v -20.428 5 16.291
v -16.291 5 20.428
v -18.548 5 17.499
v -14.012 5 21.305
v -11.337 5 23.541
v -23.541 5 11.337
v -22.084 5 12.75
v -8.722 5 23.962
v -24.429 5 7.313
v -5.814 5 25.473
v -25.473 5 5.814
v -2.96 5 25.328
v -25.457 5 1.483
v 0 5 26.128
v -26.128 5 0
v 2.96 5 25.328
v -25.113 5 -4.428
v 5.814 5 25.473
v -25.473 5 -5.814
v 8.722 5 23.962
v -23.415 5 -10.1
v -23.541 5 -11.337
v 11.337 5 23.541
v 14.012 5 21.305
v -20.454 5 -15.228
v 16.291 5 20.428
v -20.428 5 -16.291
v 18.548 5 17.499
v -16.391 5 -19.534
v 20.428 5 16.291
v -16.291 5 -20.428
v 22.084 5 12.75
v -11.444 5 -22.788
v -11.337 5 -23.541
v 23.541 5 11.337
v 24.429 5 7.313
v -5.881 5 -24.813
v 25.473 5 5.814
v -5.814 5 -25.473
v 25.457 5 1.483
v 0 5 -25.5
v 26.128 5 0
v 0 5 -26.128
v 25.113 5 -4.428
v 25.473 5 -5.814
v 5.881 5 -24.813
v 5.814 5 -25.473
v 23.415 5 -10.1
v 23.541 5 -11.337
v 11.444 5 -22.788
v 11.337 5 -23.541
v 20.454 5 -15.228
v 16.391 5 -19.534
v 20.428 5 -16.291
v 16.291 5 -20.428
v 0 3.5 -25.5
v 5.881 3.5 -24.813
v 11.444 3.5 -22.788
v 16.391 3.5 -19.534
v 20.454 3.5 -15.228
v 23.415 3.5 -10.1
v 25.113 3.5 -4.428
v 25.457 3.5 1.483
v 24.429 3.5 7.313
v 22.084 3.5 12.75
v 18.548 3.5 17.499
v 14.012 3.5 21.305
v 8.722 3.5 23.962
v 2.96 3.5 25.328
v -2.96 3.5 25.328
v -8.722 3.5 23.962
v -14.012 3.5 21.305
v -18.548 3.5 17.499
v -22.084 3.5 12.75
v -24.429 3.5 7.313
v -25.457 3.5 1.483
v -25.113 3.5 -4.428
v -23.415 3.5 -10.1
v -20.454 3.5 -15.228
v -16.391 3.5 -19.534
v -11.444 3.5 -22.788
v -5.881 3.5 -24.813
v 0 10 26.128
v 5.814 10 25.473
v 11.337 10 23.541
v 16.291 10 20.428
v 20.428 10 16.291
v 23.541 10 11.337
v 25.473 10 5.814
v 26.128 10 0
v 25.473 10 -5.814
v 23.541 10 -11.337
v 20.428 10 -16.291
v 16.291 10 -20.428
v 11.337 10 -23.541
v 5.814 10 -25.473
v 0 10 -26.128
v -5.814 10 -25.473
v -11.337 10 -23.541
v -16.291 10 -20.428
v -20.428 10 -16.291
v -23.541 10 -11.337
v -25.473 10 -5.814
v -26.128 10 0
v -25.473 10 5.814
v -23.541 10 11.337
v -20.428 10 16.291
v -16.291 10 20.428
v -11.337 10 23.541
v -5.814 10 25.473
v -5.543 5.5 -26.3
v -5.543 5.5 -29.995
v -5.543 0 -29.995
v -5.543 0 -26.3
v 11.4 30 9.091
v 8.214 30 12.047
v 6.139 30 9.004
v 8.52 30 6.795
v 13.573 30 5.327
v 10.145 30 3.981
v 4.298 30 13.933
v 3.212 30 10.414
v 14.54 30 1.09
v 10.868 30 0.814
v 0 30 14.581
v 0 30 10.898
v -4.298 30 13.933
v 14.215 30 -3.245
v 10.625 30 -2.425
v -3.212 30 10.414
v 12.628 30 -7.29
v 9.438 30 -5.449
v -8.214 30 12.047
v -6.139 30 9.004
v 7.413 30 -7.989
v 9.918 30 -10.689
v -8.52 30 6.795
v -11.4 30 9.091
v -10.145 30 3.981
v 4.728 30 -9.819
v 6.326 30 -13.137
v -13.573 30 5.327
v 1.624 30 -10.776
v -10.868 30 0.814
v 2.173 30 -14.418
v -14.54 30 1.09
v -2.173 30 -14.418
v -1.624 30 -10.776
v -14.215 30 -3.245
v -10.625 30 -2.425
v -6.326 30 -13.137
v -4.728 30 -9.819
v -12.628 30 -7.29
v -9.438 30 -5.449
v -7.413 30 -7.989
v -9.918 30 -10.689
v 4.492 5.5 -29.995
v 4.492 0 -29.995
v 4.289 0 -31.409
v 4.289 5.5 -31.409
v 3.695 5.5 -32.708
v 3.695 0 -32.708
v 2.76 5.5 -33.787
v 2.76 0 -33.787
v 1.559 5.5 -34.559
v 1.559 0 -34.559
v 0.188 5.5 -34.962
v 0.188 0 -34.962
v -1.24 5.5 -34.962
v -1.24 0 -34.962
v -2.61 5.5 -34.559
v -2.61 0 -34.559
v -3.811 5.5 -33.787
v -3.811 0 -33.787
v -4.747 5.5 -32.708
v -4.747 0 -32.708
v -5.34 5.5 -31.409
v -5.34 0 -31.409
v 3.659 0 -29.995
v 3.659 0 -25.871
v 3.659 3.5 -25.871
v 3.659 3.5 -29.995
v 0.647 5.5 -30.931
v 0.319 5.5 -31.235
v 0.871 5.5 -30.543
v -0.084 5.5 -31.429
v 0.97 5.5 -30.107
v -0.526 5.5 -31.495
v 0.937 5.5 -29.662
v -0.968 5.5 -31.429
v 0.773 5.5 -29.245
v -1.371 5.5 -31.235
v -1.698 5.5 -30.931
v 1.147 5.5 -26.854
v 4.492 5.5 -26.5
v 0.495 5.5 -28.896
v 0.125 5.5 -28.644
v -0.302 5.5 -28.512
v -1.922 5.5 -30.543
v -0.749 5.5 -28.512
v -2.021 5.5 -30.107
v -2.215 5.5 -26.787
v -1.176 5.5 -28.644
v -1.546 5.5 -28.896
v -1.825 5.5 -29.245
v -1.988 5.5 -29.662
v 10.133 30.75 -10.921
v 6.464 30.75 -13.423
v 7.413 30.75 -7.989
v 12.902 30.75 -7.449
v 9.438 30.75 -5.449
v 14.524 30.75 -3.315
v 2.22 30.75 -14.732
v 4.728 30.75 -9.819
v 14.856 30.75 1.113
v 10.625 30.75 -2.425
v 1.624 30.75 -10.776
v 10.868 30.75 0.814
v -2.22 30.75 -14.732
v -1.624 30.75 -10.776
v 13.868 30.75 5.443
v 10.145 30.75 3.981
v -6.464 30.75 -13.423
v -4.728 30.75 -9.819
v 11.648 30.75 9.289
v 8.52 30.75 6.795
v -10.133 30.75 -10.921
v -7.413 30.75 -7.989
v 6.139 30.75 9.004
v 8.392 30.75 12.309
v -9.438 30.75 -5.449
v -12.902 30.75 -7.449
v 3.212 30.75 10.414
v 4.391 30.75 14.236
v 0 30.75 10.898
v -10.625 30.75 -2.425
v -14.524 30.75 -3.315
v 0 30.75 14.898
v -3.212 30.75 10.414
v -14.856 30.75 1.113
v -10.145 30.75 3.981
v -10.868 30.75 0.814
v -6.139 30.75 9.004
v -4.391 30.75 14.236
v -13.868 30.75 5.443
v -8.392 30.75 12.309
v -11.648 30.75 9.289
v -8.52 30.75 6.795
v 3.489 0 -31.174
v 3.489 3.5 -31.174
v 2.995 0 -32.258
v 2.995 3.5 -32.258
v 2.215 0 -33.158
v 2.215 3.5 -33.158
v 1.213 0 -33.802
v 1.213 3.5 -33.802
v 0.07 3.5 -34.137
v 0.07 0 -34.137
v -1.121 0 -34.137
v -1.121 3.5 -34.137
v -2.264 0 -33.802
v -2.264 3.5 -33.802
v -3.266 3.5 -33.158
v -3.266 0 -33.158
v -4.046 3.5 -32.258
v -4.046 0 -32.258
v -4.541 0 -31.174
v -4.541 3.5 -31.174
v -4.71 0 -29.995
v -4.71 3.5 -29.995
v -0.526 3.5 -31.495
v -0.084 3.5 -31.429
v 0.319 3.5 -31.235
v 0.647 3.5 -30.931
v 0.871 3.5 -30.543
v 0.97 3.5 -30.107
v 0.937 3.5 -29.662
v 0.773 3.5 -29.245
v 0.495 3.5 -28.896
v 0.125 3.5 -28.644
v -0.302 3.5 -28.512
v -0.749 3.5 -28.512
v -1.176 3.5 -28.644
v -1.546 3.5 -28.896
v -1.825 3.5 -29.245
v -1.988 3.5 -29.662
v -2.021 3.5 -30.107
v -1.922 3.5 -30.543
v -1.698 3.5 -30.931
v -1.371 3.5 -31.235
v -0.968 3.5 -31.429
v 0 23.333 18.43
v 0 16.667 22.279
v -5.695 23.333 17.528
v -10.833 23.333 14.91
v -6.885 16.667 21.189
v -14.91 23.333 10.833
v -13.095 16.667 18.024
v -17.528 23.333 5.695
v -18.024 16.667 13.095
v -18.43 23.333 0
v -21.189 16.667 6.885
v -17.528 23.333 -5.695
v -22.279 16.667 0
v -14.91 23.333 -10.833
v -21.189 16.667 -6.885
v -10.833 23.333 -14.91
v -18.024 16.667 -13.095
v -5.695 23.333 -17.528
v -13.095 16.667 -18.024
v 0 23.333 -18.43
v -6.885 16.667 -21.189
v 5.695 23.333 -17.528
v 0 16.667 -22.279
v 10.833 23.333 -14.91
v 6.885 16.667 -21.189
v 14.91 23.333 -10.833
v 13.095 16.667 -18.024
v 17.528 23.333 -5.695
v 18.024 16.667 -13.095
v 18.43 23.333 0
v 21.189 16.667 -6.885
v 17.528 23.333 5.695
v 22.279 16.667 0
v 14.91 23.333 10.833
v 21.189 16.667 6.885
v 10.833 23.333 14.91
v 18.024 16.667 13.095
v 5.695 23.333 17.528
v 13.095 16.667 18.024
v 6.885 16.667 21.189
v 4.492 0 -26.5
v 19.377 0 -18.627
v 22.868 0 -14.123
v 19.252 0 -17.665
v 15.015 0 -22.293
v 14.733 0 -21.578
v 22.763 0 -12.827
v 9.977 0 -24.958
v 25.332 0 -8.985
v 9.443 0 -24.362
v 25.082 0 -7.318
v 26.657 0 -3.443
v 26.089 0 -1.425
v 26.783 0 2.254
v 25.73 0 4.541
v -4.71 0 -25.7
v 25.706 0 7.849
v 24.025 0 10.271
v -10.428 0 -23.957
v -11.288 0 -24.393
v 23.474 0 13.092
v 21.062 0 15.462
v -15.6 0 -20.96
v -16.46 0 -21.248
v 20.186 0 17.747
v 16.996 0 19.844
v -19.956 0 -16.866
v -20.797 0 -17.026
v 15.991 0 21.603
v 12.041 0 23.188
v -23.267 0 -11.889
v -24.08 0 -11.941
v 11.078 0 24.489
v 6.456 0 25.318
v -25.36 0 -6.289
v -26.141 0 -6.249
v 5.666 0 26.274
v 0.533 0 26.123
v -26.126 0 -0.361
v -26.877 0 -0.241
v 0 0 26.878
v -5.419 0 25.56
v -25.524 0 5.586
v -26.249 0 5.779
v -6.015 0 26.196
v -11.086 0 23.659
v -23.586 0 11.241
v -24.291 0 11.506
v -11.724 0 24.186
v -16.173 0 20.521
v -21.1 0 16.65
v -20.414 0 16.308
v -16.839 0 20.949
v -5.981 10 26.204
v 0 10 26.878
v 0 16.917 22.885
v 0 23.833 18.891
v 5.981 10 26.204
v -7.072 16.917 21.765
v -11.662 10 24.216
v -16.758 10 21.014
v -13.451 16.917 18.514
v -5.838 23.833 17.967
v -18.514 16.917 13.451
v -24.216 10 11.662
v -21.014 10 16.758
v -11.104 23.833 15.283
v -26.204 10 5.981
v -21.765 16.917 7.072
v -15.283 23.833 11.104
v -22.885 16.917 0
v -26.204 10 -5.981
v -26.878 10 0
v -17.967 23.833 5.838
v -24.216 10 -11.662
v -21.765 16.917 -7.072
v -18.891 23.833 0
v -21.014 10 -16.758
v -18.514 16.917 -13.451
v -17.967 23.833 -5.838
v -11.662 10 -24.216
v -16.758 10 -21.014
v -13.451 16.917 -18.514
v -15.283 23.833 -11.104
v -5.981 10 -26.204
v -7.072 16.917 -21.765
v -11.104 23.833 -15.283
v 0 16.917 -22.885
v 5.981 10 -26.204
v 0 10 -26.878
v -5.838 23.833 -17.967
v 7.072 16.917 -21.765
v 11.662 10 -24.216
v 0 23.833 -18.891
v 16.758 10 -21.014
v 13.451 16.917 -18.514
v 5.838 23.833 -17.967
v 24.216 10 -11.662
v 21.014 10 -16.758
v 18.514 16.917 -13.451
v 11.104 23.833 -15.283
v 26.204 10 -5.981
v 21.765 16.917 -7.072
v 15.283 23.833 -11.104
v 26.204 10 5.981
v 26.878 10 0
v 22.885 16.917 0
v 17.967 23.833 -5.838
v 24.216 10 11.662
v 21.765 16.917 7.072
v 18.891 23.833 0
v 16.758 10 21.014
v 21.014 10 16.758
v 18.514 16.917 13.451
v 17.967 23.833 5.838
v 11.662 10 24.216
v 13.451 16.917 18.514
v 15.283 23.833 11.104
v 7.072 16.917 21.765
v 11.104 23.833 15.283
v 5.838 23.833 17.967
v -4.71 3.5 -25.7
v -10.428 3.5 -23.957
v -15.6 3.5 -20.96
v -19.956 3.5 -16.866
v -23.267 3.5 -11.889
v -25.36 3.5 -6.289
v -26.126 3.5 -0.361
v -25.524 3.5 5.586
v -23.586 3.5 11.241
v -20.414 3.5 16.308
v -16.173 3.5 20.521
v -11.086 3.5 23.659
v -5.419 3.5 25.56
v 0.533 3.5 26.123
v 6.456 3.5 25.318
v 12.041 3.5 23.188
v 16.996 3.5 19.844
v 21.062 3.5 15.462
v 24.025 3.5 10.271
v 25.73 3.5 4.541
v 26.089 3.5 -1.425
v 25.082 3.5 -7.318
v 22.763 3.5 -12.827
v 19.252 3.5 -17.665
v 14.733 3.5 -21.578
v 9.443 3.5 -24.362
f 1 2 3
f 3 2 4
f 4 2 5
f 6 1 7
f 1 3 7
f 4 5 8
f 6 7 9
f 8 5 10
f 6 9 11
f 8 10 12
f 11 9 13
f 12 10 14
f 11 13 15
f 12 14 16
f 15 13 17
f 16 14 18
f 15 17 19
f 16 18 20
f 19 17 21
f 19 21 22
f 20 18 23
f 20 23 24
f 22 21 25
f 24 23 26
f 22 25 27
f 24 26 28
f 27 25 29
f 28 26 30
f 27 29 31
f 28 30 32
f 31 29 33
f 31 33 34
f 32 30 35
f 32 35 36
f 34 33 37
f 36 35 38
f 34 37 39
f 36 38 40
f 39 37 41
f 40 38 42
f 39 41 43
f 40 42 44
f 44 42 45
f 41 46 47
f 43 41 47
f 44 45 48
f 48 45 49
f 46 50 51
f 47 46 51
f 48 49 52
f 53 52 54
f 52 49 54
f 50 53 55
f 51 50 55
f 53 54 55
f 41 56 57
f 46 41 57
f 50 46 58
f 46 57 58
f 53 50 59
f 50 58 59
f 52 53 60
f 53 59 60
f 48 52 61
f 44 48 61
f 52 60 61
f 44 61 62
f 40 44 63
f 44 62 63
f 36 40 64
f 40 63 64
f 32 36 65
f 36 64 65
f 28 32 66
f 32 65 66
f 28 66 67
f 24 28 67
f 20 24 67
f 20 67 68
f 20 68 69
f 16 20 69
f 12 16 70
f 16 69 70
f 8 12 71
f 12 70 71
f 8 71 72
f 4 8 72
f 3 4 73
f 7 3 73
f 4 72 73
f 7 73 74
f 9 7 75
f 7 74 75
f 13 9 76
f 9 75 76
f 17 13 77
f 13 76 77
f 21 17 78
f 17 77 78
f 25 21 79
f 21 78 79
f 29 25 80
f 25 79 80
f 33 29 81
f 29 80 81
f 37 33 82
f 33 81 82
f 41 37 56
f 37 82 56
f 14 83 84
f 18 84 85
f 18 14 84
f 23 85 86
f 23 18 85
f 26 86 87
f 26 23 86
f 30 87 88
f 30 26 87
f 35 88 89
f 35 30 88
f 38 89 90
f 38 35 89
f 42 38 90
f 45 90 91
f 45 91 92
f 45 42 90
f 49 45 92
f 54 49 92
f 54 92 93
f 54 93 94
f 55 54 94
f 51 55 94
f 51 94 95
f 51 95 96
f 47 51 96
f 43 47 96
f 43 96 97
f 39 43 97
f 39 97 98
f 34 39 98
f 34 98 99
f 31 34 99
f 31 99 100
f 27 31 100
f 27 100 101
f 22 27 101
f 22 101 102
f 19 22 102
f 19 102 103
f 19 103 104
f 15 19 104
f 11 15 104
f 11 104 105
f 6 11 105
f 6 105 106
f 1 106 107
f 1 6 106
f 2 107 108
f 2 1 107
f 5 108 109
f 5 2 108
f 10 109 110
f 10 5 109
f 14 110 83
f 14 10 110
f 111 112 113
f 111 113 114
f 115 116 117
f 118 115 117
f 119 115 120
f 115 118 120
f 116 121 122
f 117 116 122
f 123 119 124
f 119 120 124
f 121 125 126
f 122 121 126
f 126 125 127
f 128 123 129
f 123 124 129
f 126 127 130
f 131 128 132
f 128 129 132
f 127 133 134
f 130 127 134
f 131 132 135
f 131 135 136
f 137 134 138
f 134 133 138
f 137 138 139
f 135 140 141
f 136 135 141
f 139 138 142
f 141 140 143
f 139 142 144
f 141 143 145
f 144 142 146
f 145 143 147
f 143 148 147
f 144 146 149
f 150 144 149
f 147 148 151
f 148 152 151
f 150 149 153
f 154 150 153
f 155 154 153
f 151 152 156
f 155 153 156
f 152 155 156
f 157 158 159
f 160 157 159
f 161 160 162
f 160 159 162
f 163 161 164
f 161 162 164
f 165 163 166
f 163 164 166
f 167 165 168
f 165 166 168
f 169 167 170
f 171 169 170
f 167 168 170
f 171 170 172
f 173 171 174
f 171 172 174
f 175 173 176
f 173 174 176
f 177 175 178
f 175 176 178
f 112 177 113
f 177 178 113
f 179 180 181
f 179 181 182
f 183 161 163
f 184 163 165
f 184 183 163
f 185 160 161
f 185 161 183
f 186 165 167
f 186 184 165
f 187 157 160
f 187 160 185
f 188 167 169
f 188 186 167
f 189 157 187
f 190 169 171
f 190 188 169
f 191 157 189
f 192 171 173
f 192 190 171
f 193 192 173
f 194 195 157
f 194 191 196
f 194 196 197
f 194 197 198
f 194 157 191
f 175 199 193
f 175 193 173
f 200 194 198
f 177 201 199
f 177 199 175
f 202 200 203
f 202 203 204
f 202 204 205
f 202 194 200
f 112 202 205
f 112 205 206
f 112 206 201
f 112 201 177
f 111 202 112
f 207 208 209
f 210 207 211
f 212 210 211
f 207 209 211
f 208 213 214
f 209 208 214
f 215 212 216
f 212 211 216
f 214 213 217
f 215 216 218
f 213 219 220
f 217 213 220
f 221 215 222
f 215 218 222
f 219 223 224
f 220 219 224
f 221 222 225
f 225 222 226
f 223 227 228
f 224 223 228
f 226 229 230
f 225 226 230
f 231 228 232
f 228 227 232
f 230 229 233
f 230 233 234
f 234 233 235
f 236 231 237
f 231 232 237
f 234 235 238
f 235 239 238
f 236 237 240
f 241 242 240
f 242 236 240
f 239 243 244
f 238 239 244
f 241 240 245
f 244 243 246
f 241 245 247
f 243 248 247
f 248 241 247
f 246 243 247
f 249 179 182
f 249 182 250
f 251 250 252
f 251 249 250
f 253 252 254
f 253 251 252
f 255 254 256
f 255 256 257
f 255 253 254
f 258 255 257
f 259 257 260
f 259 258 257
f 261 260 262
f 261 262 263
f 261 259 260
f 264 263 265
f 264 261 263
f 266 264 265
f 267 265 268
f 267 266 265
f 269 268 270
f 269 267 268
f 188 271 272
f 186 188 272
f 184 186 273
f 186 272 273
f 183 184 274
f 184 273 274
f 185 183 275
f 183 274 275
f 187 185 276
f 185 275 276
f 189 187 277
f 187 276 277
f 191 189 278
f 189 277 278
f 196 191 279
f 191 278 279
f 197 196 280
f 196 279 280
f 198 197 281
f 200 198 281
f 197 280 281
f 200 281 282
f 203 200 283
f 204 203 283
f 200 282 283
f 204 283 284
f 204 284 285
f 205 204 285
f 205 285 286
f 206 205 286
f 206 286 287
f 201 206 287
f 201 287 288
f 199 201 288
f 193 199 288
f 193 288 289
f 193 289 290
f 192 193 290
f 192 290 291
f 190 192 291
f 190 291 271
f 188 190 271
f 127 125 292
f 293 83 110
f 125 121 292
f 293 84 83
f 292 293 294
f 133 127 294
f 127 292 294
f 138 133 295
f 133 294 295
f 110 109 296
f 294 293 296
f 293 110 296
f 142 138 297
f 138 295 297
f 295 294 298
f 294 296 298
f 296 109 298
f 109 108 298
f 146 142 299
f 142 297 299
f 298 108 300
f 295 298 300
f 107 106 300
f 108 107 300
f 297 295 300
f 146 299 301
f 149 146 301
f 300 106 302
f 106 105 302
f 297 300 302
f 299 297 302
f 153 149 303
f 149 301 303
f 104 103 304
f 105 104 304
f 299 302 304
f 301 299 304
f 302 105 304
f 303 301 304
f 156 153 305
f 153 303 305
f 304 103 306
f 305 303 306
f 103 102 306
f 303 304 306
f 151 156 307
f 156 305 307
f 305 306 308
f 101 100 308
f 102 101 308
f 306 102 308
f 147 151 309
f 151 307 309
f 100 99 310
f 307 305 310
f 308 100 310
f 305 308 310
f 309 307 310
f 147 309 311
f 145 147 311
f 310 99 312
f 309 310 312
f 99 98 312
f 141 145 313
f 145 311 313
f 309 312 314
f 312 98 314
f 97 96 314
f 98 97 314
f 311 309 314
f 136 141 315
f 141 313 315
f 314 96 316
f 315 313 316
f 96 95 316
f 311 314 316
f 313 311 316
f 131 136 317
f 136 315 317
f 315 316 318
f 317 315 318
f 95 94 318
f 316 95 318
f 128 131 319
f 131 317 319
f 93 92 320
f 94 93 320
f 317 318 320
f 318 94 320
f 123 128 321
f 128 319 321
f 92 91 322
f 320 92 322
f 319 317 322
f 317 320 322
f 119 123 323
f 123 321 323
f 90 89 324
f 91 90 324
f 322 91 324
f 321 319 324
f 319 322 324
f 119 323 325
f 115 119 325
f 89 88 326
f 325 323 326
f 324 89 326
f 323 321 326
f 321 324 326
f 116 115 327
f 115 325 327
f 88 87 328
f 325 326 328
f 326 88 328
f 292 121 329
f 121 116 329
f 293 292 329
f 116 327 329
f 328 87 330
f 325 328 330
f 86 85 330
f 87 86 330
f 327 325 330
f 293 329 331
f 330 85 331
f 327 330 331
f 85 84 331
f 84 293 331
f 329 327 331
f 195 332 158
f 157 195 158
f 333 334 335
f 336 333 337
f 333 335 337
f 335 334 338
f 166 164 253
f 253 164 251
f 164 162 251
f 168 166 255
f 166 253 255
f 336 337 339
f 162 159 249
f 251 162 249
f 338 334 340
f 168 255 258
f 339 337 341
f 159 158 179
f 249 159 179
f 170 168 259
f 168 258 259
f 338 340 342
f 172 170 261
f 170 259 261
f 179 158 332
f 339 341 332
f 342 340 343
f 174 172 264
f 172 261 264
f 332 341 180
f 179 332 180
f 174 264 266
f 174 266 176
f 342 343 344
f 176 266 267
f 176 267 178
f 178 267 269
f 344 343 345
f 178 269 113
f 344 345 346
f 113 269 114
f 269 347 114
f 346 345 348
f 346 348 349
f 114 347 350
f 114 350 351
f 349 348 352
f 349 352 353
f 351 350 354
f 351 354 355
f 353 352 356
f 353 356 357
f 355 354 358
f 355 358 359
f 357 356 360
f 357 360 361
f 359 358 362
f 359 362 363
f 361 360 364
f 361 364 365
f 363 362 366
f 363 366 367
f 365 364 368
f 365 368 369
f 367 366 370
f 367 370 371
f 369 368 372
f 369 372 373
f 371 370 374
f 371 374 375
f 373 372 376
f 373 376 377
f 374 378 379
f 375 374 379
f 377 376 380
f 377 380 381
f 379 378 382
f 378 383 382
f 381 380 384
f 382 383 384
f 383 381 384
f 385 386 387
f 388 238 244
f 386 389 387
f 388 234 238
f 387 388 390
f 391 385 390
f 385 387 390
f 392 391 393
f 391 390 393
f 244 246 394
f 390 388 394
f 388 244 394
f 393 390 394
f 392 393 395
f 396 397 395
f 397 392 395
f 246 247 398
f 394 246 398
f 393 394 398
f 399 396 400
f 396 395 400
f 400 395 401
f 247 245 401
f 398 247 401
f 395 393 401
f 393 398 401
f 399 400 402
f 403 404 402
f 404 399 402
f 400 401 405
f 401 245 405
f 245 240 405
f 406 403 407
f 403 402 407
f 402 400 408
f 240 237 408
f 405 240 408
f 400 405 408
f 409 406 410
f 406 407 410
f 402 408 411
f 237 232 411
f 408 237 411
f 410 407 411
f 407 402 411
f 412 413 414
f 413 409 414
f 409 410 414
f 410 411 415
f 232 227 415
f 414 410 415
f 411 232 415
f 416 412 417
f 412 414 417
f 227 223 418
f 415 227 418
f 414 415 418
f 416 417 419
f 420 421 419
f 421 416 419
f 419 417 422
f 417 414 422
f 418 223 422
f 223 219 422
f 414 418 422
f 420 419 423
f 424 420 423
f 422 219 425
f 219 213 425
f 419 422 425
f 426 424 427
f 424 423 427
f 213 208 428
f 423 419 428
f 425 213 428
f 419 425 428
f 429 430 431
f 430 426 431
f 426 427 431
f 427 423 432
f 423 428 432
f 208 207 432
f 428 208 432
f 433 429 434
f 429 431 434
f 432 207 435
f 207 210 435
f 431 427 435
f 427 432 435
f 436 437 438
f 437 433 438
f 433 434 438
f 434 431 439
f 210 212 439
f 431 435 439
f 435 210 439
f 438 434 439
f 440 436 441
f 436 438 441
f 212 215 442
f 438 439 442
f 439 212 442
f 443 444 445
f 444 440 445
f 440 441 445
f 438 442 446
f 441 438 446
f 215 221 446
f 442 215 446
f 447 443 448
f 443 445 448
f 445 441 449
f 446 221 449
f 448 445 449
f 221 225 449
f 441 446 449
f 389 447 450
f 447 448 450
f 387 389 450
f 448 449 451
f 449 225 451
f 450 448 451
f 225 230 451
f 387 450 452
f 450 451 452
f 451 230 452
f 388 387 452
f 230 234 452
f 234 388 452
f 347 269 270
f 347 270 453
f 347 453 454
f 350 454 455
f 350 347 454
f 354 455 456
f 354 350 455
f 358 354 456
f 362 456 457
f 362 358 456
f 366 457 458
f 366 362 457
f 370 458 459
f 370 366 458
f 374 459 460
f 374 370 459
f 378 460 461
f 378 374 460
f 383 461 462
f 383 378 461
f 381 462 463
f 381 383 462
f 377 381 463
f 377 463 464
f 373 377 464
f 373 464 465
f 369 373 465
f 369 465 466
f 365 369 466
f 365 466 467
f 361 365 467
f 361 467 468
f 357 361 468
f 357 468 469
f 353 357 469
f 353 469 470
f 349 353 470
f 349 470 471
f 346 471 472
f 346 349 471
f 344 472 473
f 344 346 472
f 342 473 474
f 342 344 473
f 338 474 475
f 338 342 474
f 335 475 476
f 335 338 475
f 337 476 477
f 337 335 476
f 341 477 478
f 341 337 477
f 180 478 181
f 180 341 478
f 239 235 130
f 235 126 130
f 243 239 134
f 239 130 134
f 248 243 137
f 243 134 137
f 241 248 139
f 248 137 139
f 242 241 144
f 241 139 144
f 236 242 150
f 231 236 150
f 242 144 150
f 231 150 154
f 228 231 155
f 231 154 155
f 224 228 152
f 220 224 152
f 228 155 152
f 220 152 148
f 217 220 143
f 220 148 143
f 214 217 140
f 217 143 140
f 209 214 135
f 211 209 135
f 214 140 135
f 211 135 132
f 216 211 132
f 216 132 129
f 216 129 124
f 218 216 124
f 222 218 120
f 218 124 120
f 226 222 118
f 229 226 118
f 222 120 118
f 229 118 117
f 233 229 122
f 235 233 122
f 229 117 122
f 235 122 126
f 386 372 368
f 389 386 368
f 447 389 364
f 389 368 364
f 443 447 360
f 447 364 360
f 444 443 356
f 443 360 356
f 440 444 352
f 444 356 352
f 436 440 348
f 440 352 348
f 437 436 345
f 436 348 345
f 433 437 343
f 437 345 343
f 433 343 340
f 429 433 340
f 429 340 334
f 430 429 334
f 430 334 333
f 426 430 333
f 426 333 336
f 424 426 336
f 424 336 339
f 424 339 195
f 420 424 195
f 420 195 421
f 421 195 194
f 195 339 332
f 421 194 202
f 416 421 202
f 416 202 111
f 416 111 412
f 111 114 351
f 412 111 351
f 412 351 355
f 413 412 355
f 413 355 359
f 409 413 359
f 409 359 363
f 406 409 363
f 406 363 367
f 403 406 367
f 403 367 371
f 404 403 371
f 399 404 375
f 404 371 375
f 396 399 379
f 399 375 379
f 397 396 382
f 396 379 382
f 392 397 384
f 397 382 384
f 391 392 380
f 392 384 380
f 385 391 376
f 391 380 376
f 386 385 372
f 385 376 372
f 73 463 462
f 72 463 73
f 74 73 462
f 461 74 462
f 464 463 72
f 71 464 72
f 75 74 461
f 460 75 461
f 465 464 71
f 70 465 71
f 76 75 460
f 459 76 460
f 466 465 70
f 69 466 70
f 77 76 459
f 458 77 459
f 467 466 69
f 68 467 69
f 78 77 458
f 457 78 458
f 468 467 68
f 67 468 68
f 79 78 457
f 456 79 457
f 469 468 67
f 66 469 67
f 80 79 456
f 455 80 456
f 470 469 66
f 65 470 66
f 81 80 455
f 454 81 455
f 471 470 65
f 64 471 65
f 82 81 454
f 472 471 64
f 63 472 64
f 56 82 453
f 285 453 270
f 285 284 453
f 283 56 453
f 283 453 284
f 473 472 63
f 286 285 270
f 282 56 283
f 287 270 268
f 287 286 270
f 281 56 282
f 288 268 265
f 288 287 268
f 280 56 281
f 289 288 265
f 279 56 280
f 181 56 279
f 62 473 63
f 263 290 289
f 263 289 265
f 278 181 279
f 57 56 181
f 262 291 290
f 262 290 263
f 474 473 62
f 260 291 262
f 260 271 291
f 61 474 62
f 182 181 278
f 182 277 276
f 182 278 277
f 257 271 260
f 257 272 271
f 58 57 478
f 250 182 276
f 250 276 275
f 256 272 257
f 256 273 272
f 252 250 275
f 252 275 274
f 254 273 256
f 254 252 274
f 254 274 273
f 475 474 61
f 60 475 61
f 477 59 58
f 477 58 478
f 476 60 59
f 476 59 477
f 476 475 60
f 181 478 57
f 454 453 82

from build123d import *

# Parameters (mm, degrees)
SKETCH3_R           = 26.878
SKETCH3_R_2         = 26.128
BOSS_EXTRUDE1_DEPTH = 10
SKETCH5_R           = 1.5
BOSS_EXTRUDE4_DEPTH = 5.5
CUT_EXTRUDE1_DEPTH  = 3.5
BOSS_EXTRUDE5_START = -3.5
SKETCH8_R           = 26.128
SKETCH8_R_2         = 25.5
BOSS_EXTRUDE5_DEPTH = 1.5


with BuildPart() as part:
    # Sketch3 → Boss-Extrude1 (new body)
    with BuildSketch(Plane(origin=(0, 0, 0), x_dir=(1, 0, 0), z_dir=(0, 1, 0))):
        with Locations(Location((0, 0, 0), (0, 0, 270))):
            Circle(SKETCH3_R)
        with Locations(Location((0, 0, 0), (0, 0, 270))):
            Circle(SKETCH3_R_2, mode=Mode.SUBTRACT)
    extrude(amount=BOSS_EXTRUDE1_DEPTH)

    # Sketch5 → Boss-Extrude4 (add)
    with BuildSketch(Plane.XZ):
        with BuildLine():
            Line((-5.543162198, -29.995394675), (-5.543162198, -26.300194616))
            ThreePointArc((-5.543162198, -26.300194616), (-0.534858171, -26.863033142), (4.491880525, -26.499997988))
            Line((4.491880525, -26.499997988), (4.491880525, -29.995394675))
            ThreePointArc((4.491880525, -29.995394675), (-0.525640836, -35.012916036), (-5.543162198, -29.995394675))
        make_face()
        with Locations(Location((-0.525640836, -29.995394675, 0), (0, 0, 270))):
            Circle(SKETCH5_R, mode=Mode.SUBTRACT)
    extrude(amount=-BOSS_EXTRUDE4_DEPTH)

    # Sketch6 → Cut-Extrude1 (cut)
    with BuildSketch(Plane(origin=(0, 0, 0), x_dir=(-1, 0, 0), z_dir=(0, -1, 0))):
        with BuildLine():
            Line((4.710133197, 29.995394675), (4.710133197, 25.699942204))
            ThreePointArc((4.710133197, 25.699942204), (0.530383369, 26.096098926), (-3.658851524, 25.81760336))
            Line((-3.658851524, 25.81760336), (-3.658851524, 29.995394675))
            ThreePointArc((-3.658851524, 29.995394675), (0.525640836, 34.179887036), (4.710133197, 29.995394675))
        make_face()
    extrude(amount=-CUT_EXTRUDE1_DEPTH, mode=Mode.SUBTRACT)

    # Sketch7 → Revolve1 (revolve)
    with BuildSketch(Plane.XY, mode=Mode.PRIVATE) as revolve1_sk:
        Polygon((-26.878, 10), (-14.897981914, 30.75), (-10.897981914, 30.75), (-10.897981914, 30), (-14.580994616, 30), (-26.128, 10), align=None)
    revolve(revolve1_sk.sketch.rotate(Axis((0, 30.1875, 0), (0, -1, 0)), 270), axis=Axis((0, 30.1875, 0), (0, -1, 0)))

    # Sketch8 → Boss-Extrude5 (add)
    with BuildSketch(Plane.XZ.offset(BOSS_EXTRUDE5_START)):
        with Locations(Location((0, 0, 0), (0, 0, 270))):
            Circle(SKETCH8_R)
        with Locations(Location((0, 0, 0), (0, 0, 270))):
            Circle(SKETCH8_R_2, mode=Mode.SUBTRACT)
    extrude(amount=-BOSS_EXTRUDE5_DEPTH)


solid = part.part
